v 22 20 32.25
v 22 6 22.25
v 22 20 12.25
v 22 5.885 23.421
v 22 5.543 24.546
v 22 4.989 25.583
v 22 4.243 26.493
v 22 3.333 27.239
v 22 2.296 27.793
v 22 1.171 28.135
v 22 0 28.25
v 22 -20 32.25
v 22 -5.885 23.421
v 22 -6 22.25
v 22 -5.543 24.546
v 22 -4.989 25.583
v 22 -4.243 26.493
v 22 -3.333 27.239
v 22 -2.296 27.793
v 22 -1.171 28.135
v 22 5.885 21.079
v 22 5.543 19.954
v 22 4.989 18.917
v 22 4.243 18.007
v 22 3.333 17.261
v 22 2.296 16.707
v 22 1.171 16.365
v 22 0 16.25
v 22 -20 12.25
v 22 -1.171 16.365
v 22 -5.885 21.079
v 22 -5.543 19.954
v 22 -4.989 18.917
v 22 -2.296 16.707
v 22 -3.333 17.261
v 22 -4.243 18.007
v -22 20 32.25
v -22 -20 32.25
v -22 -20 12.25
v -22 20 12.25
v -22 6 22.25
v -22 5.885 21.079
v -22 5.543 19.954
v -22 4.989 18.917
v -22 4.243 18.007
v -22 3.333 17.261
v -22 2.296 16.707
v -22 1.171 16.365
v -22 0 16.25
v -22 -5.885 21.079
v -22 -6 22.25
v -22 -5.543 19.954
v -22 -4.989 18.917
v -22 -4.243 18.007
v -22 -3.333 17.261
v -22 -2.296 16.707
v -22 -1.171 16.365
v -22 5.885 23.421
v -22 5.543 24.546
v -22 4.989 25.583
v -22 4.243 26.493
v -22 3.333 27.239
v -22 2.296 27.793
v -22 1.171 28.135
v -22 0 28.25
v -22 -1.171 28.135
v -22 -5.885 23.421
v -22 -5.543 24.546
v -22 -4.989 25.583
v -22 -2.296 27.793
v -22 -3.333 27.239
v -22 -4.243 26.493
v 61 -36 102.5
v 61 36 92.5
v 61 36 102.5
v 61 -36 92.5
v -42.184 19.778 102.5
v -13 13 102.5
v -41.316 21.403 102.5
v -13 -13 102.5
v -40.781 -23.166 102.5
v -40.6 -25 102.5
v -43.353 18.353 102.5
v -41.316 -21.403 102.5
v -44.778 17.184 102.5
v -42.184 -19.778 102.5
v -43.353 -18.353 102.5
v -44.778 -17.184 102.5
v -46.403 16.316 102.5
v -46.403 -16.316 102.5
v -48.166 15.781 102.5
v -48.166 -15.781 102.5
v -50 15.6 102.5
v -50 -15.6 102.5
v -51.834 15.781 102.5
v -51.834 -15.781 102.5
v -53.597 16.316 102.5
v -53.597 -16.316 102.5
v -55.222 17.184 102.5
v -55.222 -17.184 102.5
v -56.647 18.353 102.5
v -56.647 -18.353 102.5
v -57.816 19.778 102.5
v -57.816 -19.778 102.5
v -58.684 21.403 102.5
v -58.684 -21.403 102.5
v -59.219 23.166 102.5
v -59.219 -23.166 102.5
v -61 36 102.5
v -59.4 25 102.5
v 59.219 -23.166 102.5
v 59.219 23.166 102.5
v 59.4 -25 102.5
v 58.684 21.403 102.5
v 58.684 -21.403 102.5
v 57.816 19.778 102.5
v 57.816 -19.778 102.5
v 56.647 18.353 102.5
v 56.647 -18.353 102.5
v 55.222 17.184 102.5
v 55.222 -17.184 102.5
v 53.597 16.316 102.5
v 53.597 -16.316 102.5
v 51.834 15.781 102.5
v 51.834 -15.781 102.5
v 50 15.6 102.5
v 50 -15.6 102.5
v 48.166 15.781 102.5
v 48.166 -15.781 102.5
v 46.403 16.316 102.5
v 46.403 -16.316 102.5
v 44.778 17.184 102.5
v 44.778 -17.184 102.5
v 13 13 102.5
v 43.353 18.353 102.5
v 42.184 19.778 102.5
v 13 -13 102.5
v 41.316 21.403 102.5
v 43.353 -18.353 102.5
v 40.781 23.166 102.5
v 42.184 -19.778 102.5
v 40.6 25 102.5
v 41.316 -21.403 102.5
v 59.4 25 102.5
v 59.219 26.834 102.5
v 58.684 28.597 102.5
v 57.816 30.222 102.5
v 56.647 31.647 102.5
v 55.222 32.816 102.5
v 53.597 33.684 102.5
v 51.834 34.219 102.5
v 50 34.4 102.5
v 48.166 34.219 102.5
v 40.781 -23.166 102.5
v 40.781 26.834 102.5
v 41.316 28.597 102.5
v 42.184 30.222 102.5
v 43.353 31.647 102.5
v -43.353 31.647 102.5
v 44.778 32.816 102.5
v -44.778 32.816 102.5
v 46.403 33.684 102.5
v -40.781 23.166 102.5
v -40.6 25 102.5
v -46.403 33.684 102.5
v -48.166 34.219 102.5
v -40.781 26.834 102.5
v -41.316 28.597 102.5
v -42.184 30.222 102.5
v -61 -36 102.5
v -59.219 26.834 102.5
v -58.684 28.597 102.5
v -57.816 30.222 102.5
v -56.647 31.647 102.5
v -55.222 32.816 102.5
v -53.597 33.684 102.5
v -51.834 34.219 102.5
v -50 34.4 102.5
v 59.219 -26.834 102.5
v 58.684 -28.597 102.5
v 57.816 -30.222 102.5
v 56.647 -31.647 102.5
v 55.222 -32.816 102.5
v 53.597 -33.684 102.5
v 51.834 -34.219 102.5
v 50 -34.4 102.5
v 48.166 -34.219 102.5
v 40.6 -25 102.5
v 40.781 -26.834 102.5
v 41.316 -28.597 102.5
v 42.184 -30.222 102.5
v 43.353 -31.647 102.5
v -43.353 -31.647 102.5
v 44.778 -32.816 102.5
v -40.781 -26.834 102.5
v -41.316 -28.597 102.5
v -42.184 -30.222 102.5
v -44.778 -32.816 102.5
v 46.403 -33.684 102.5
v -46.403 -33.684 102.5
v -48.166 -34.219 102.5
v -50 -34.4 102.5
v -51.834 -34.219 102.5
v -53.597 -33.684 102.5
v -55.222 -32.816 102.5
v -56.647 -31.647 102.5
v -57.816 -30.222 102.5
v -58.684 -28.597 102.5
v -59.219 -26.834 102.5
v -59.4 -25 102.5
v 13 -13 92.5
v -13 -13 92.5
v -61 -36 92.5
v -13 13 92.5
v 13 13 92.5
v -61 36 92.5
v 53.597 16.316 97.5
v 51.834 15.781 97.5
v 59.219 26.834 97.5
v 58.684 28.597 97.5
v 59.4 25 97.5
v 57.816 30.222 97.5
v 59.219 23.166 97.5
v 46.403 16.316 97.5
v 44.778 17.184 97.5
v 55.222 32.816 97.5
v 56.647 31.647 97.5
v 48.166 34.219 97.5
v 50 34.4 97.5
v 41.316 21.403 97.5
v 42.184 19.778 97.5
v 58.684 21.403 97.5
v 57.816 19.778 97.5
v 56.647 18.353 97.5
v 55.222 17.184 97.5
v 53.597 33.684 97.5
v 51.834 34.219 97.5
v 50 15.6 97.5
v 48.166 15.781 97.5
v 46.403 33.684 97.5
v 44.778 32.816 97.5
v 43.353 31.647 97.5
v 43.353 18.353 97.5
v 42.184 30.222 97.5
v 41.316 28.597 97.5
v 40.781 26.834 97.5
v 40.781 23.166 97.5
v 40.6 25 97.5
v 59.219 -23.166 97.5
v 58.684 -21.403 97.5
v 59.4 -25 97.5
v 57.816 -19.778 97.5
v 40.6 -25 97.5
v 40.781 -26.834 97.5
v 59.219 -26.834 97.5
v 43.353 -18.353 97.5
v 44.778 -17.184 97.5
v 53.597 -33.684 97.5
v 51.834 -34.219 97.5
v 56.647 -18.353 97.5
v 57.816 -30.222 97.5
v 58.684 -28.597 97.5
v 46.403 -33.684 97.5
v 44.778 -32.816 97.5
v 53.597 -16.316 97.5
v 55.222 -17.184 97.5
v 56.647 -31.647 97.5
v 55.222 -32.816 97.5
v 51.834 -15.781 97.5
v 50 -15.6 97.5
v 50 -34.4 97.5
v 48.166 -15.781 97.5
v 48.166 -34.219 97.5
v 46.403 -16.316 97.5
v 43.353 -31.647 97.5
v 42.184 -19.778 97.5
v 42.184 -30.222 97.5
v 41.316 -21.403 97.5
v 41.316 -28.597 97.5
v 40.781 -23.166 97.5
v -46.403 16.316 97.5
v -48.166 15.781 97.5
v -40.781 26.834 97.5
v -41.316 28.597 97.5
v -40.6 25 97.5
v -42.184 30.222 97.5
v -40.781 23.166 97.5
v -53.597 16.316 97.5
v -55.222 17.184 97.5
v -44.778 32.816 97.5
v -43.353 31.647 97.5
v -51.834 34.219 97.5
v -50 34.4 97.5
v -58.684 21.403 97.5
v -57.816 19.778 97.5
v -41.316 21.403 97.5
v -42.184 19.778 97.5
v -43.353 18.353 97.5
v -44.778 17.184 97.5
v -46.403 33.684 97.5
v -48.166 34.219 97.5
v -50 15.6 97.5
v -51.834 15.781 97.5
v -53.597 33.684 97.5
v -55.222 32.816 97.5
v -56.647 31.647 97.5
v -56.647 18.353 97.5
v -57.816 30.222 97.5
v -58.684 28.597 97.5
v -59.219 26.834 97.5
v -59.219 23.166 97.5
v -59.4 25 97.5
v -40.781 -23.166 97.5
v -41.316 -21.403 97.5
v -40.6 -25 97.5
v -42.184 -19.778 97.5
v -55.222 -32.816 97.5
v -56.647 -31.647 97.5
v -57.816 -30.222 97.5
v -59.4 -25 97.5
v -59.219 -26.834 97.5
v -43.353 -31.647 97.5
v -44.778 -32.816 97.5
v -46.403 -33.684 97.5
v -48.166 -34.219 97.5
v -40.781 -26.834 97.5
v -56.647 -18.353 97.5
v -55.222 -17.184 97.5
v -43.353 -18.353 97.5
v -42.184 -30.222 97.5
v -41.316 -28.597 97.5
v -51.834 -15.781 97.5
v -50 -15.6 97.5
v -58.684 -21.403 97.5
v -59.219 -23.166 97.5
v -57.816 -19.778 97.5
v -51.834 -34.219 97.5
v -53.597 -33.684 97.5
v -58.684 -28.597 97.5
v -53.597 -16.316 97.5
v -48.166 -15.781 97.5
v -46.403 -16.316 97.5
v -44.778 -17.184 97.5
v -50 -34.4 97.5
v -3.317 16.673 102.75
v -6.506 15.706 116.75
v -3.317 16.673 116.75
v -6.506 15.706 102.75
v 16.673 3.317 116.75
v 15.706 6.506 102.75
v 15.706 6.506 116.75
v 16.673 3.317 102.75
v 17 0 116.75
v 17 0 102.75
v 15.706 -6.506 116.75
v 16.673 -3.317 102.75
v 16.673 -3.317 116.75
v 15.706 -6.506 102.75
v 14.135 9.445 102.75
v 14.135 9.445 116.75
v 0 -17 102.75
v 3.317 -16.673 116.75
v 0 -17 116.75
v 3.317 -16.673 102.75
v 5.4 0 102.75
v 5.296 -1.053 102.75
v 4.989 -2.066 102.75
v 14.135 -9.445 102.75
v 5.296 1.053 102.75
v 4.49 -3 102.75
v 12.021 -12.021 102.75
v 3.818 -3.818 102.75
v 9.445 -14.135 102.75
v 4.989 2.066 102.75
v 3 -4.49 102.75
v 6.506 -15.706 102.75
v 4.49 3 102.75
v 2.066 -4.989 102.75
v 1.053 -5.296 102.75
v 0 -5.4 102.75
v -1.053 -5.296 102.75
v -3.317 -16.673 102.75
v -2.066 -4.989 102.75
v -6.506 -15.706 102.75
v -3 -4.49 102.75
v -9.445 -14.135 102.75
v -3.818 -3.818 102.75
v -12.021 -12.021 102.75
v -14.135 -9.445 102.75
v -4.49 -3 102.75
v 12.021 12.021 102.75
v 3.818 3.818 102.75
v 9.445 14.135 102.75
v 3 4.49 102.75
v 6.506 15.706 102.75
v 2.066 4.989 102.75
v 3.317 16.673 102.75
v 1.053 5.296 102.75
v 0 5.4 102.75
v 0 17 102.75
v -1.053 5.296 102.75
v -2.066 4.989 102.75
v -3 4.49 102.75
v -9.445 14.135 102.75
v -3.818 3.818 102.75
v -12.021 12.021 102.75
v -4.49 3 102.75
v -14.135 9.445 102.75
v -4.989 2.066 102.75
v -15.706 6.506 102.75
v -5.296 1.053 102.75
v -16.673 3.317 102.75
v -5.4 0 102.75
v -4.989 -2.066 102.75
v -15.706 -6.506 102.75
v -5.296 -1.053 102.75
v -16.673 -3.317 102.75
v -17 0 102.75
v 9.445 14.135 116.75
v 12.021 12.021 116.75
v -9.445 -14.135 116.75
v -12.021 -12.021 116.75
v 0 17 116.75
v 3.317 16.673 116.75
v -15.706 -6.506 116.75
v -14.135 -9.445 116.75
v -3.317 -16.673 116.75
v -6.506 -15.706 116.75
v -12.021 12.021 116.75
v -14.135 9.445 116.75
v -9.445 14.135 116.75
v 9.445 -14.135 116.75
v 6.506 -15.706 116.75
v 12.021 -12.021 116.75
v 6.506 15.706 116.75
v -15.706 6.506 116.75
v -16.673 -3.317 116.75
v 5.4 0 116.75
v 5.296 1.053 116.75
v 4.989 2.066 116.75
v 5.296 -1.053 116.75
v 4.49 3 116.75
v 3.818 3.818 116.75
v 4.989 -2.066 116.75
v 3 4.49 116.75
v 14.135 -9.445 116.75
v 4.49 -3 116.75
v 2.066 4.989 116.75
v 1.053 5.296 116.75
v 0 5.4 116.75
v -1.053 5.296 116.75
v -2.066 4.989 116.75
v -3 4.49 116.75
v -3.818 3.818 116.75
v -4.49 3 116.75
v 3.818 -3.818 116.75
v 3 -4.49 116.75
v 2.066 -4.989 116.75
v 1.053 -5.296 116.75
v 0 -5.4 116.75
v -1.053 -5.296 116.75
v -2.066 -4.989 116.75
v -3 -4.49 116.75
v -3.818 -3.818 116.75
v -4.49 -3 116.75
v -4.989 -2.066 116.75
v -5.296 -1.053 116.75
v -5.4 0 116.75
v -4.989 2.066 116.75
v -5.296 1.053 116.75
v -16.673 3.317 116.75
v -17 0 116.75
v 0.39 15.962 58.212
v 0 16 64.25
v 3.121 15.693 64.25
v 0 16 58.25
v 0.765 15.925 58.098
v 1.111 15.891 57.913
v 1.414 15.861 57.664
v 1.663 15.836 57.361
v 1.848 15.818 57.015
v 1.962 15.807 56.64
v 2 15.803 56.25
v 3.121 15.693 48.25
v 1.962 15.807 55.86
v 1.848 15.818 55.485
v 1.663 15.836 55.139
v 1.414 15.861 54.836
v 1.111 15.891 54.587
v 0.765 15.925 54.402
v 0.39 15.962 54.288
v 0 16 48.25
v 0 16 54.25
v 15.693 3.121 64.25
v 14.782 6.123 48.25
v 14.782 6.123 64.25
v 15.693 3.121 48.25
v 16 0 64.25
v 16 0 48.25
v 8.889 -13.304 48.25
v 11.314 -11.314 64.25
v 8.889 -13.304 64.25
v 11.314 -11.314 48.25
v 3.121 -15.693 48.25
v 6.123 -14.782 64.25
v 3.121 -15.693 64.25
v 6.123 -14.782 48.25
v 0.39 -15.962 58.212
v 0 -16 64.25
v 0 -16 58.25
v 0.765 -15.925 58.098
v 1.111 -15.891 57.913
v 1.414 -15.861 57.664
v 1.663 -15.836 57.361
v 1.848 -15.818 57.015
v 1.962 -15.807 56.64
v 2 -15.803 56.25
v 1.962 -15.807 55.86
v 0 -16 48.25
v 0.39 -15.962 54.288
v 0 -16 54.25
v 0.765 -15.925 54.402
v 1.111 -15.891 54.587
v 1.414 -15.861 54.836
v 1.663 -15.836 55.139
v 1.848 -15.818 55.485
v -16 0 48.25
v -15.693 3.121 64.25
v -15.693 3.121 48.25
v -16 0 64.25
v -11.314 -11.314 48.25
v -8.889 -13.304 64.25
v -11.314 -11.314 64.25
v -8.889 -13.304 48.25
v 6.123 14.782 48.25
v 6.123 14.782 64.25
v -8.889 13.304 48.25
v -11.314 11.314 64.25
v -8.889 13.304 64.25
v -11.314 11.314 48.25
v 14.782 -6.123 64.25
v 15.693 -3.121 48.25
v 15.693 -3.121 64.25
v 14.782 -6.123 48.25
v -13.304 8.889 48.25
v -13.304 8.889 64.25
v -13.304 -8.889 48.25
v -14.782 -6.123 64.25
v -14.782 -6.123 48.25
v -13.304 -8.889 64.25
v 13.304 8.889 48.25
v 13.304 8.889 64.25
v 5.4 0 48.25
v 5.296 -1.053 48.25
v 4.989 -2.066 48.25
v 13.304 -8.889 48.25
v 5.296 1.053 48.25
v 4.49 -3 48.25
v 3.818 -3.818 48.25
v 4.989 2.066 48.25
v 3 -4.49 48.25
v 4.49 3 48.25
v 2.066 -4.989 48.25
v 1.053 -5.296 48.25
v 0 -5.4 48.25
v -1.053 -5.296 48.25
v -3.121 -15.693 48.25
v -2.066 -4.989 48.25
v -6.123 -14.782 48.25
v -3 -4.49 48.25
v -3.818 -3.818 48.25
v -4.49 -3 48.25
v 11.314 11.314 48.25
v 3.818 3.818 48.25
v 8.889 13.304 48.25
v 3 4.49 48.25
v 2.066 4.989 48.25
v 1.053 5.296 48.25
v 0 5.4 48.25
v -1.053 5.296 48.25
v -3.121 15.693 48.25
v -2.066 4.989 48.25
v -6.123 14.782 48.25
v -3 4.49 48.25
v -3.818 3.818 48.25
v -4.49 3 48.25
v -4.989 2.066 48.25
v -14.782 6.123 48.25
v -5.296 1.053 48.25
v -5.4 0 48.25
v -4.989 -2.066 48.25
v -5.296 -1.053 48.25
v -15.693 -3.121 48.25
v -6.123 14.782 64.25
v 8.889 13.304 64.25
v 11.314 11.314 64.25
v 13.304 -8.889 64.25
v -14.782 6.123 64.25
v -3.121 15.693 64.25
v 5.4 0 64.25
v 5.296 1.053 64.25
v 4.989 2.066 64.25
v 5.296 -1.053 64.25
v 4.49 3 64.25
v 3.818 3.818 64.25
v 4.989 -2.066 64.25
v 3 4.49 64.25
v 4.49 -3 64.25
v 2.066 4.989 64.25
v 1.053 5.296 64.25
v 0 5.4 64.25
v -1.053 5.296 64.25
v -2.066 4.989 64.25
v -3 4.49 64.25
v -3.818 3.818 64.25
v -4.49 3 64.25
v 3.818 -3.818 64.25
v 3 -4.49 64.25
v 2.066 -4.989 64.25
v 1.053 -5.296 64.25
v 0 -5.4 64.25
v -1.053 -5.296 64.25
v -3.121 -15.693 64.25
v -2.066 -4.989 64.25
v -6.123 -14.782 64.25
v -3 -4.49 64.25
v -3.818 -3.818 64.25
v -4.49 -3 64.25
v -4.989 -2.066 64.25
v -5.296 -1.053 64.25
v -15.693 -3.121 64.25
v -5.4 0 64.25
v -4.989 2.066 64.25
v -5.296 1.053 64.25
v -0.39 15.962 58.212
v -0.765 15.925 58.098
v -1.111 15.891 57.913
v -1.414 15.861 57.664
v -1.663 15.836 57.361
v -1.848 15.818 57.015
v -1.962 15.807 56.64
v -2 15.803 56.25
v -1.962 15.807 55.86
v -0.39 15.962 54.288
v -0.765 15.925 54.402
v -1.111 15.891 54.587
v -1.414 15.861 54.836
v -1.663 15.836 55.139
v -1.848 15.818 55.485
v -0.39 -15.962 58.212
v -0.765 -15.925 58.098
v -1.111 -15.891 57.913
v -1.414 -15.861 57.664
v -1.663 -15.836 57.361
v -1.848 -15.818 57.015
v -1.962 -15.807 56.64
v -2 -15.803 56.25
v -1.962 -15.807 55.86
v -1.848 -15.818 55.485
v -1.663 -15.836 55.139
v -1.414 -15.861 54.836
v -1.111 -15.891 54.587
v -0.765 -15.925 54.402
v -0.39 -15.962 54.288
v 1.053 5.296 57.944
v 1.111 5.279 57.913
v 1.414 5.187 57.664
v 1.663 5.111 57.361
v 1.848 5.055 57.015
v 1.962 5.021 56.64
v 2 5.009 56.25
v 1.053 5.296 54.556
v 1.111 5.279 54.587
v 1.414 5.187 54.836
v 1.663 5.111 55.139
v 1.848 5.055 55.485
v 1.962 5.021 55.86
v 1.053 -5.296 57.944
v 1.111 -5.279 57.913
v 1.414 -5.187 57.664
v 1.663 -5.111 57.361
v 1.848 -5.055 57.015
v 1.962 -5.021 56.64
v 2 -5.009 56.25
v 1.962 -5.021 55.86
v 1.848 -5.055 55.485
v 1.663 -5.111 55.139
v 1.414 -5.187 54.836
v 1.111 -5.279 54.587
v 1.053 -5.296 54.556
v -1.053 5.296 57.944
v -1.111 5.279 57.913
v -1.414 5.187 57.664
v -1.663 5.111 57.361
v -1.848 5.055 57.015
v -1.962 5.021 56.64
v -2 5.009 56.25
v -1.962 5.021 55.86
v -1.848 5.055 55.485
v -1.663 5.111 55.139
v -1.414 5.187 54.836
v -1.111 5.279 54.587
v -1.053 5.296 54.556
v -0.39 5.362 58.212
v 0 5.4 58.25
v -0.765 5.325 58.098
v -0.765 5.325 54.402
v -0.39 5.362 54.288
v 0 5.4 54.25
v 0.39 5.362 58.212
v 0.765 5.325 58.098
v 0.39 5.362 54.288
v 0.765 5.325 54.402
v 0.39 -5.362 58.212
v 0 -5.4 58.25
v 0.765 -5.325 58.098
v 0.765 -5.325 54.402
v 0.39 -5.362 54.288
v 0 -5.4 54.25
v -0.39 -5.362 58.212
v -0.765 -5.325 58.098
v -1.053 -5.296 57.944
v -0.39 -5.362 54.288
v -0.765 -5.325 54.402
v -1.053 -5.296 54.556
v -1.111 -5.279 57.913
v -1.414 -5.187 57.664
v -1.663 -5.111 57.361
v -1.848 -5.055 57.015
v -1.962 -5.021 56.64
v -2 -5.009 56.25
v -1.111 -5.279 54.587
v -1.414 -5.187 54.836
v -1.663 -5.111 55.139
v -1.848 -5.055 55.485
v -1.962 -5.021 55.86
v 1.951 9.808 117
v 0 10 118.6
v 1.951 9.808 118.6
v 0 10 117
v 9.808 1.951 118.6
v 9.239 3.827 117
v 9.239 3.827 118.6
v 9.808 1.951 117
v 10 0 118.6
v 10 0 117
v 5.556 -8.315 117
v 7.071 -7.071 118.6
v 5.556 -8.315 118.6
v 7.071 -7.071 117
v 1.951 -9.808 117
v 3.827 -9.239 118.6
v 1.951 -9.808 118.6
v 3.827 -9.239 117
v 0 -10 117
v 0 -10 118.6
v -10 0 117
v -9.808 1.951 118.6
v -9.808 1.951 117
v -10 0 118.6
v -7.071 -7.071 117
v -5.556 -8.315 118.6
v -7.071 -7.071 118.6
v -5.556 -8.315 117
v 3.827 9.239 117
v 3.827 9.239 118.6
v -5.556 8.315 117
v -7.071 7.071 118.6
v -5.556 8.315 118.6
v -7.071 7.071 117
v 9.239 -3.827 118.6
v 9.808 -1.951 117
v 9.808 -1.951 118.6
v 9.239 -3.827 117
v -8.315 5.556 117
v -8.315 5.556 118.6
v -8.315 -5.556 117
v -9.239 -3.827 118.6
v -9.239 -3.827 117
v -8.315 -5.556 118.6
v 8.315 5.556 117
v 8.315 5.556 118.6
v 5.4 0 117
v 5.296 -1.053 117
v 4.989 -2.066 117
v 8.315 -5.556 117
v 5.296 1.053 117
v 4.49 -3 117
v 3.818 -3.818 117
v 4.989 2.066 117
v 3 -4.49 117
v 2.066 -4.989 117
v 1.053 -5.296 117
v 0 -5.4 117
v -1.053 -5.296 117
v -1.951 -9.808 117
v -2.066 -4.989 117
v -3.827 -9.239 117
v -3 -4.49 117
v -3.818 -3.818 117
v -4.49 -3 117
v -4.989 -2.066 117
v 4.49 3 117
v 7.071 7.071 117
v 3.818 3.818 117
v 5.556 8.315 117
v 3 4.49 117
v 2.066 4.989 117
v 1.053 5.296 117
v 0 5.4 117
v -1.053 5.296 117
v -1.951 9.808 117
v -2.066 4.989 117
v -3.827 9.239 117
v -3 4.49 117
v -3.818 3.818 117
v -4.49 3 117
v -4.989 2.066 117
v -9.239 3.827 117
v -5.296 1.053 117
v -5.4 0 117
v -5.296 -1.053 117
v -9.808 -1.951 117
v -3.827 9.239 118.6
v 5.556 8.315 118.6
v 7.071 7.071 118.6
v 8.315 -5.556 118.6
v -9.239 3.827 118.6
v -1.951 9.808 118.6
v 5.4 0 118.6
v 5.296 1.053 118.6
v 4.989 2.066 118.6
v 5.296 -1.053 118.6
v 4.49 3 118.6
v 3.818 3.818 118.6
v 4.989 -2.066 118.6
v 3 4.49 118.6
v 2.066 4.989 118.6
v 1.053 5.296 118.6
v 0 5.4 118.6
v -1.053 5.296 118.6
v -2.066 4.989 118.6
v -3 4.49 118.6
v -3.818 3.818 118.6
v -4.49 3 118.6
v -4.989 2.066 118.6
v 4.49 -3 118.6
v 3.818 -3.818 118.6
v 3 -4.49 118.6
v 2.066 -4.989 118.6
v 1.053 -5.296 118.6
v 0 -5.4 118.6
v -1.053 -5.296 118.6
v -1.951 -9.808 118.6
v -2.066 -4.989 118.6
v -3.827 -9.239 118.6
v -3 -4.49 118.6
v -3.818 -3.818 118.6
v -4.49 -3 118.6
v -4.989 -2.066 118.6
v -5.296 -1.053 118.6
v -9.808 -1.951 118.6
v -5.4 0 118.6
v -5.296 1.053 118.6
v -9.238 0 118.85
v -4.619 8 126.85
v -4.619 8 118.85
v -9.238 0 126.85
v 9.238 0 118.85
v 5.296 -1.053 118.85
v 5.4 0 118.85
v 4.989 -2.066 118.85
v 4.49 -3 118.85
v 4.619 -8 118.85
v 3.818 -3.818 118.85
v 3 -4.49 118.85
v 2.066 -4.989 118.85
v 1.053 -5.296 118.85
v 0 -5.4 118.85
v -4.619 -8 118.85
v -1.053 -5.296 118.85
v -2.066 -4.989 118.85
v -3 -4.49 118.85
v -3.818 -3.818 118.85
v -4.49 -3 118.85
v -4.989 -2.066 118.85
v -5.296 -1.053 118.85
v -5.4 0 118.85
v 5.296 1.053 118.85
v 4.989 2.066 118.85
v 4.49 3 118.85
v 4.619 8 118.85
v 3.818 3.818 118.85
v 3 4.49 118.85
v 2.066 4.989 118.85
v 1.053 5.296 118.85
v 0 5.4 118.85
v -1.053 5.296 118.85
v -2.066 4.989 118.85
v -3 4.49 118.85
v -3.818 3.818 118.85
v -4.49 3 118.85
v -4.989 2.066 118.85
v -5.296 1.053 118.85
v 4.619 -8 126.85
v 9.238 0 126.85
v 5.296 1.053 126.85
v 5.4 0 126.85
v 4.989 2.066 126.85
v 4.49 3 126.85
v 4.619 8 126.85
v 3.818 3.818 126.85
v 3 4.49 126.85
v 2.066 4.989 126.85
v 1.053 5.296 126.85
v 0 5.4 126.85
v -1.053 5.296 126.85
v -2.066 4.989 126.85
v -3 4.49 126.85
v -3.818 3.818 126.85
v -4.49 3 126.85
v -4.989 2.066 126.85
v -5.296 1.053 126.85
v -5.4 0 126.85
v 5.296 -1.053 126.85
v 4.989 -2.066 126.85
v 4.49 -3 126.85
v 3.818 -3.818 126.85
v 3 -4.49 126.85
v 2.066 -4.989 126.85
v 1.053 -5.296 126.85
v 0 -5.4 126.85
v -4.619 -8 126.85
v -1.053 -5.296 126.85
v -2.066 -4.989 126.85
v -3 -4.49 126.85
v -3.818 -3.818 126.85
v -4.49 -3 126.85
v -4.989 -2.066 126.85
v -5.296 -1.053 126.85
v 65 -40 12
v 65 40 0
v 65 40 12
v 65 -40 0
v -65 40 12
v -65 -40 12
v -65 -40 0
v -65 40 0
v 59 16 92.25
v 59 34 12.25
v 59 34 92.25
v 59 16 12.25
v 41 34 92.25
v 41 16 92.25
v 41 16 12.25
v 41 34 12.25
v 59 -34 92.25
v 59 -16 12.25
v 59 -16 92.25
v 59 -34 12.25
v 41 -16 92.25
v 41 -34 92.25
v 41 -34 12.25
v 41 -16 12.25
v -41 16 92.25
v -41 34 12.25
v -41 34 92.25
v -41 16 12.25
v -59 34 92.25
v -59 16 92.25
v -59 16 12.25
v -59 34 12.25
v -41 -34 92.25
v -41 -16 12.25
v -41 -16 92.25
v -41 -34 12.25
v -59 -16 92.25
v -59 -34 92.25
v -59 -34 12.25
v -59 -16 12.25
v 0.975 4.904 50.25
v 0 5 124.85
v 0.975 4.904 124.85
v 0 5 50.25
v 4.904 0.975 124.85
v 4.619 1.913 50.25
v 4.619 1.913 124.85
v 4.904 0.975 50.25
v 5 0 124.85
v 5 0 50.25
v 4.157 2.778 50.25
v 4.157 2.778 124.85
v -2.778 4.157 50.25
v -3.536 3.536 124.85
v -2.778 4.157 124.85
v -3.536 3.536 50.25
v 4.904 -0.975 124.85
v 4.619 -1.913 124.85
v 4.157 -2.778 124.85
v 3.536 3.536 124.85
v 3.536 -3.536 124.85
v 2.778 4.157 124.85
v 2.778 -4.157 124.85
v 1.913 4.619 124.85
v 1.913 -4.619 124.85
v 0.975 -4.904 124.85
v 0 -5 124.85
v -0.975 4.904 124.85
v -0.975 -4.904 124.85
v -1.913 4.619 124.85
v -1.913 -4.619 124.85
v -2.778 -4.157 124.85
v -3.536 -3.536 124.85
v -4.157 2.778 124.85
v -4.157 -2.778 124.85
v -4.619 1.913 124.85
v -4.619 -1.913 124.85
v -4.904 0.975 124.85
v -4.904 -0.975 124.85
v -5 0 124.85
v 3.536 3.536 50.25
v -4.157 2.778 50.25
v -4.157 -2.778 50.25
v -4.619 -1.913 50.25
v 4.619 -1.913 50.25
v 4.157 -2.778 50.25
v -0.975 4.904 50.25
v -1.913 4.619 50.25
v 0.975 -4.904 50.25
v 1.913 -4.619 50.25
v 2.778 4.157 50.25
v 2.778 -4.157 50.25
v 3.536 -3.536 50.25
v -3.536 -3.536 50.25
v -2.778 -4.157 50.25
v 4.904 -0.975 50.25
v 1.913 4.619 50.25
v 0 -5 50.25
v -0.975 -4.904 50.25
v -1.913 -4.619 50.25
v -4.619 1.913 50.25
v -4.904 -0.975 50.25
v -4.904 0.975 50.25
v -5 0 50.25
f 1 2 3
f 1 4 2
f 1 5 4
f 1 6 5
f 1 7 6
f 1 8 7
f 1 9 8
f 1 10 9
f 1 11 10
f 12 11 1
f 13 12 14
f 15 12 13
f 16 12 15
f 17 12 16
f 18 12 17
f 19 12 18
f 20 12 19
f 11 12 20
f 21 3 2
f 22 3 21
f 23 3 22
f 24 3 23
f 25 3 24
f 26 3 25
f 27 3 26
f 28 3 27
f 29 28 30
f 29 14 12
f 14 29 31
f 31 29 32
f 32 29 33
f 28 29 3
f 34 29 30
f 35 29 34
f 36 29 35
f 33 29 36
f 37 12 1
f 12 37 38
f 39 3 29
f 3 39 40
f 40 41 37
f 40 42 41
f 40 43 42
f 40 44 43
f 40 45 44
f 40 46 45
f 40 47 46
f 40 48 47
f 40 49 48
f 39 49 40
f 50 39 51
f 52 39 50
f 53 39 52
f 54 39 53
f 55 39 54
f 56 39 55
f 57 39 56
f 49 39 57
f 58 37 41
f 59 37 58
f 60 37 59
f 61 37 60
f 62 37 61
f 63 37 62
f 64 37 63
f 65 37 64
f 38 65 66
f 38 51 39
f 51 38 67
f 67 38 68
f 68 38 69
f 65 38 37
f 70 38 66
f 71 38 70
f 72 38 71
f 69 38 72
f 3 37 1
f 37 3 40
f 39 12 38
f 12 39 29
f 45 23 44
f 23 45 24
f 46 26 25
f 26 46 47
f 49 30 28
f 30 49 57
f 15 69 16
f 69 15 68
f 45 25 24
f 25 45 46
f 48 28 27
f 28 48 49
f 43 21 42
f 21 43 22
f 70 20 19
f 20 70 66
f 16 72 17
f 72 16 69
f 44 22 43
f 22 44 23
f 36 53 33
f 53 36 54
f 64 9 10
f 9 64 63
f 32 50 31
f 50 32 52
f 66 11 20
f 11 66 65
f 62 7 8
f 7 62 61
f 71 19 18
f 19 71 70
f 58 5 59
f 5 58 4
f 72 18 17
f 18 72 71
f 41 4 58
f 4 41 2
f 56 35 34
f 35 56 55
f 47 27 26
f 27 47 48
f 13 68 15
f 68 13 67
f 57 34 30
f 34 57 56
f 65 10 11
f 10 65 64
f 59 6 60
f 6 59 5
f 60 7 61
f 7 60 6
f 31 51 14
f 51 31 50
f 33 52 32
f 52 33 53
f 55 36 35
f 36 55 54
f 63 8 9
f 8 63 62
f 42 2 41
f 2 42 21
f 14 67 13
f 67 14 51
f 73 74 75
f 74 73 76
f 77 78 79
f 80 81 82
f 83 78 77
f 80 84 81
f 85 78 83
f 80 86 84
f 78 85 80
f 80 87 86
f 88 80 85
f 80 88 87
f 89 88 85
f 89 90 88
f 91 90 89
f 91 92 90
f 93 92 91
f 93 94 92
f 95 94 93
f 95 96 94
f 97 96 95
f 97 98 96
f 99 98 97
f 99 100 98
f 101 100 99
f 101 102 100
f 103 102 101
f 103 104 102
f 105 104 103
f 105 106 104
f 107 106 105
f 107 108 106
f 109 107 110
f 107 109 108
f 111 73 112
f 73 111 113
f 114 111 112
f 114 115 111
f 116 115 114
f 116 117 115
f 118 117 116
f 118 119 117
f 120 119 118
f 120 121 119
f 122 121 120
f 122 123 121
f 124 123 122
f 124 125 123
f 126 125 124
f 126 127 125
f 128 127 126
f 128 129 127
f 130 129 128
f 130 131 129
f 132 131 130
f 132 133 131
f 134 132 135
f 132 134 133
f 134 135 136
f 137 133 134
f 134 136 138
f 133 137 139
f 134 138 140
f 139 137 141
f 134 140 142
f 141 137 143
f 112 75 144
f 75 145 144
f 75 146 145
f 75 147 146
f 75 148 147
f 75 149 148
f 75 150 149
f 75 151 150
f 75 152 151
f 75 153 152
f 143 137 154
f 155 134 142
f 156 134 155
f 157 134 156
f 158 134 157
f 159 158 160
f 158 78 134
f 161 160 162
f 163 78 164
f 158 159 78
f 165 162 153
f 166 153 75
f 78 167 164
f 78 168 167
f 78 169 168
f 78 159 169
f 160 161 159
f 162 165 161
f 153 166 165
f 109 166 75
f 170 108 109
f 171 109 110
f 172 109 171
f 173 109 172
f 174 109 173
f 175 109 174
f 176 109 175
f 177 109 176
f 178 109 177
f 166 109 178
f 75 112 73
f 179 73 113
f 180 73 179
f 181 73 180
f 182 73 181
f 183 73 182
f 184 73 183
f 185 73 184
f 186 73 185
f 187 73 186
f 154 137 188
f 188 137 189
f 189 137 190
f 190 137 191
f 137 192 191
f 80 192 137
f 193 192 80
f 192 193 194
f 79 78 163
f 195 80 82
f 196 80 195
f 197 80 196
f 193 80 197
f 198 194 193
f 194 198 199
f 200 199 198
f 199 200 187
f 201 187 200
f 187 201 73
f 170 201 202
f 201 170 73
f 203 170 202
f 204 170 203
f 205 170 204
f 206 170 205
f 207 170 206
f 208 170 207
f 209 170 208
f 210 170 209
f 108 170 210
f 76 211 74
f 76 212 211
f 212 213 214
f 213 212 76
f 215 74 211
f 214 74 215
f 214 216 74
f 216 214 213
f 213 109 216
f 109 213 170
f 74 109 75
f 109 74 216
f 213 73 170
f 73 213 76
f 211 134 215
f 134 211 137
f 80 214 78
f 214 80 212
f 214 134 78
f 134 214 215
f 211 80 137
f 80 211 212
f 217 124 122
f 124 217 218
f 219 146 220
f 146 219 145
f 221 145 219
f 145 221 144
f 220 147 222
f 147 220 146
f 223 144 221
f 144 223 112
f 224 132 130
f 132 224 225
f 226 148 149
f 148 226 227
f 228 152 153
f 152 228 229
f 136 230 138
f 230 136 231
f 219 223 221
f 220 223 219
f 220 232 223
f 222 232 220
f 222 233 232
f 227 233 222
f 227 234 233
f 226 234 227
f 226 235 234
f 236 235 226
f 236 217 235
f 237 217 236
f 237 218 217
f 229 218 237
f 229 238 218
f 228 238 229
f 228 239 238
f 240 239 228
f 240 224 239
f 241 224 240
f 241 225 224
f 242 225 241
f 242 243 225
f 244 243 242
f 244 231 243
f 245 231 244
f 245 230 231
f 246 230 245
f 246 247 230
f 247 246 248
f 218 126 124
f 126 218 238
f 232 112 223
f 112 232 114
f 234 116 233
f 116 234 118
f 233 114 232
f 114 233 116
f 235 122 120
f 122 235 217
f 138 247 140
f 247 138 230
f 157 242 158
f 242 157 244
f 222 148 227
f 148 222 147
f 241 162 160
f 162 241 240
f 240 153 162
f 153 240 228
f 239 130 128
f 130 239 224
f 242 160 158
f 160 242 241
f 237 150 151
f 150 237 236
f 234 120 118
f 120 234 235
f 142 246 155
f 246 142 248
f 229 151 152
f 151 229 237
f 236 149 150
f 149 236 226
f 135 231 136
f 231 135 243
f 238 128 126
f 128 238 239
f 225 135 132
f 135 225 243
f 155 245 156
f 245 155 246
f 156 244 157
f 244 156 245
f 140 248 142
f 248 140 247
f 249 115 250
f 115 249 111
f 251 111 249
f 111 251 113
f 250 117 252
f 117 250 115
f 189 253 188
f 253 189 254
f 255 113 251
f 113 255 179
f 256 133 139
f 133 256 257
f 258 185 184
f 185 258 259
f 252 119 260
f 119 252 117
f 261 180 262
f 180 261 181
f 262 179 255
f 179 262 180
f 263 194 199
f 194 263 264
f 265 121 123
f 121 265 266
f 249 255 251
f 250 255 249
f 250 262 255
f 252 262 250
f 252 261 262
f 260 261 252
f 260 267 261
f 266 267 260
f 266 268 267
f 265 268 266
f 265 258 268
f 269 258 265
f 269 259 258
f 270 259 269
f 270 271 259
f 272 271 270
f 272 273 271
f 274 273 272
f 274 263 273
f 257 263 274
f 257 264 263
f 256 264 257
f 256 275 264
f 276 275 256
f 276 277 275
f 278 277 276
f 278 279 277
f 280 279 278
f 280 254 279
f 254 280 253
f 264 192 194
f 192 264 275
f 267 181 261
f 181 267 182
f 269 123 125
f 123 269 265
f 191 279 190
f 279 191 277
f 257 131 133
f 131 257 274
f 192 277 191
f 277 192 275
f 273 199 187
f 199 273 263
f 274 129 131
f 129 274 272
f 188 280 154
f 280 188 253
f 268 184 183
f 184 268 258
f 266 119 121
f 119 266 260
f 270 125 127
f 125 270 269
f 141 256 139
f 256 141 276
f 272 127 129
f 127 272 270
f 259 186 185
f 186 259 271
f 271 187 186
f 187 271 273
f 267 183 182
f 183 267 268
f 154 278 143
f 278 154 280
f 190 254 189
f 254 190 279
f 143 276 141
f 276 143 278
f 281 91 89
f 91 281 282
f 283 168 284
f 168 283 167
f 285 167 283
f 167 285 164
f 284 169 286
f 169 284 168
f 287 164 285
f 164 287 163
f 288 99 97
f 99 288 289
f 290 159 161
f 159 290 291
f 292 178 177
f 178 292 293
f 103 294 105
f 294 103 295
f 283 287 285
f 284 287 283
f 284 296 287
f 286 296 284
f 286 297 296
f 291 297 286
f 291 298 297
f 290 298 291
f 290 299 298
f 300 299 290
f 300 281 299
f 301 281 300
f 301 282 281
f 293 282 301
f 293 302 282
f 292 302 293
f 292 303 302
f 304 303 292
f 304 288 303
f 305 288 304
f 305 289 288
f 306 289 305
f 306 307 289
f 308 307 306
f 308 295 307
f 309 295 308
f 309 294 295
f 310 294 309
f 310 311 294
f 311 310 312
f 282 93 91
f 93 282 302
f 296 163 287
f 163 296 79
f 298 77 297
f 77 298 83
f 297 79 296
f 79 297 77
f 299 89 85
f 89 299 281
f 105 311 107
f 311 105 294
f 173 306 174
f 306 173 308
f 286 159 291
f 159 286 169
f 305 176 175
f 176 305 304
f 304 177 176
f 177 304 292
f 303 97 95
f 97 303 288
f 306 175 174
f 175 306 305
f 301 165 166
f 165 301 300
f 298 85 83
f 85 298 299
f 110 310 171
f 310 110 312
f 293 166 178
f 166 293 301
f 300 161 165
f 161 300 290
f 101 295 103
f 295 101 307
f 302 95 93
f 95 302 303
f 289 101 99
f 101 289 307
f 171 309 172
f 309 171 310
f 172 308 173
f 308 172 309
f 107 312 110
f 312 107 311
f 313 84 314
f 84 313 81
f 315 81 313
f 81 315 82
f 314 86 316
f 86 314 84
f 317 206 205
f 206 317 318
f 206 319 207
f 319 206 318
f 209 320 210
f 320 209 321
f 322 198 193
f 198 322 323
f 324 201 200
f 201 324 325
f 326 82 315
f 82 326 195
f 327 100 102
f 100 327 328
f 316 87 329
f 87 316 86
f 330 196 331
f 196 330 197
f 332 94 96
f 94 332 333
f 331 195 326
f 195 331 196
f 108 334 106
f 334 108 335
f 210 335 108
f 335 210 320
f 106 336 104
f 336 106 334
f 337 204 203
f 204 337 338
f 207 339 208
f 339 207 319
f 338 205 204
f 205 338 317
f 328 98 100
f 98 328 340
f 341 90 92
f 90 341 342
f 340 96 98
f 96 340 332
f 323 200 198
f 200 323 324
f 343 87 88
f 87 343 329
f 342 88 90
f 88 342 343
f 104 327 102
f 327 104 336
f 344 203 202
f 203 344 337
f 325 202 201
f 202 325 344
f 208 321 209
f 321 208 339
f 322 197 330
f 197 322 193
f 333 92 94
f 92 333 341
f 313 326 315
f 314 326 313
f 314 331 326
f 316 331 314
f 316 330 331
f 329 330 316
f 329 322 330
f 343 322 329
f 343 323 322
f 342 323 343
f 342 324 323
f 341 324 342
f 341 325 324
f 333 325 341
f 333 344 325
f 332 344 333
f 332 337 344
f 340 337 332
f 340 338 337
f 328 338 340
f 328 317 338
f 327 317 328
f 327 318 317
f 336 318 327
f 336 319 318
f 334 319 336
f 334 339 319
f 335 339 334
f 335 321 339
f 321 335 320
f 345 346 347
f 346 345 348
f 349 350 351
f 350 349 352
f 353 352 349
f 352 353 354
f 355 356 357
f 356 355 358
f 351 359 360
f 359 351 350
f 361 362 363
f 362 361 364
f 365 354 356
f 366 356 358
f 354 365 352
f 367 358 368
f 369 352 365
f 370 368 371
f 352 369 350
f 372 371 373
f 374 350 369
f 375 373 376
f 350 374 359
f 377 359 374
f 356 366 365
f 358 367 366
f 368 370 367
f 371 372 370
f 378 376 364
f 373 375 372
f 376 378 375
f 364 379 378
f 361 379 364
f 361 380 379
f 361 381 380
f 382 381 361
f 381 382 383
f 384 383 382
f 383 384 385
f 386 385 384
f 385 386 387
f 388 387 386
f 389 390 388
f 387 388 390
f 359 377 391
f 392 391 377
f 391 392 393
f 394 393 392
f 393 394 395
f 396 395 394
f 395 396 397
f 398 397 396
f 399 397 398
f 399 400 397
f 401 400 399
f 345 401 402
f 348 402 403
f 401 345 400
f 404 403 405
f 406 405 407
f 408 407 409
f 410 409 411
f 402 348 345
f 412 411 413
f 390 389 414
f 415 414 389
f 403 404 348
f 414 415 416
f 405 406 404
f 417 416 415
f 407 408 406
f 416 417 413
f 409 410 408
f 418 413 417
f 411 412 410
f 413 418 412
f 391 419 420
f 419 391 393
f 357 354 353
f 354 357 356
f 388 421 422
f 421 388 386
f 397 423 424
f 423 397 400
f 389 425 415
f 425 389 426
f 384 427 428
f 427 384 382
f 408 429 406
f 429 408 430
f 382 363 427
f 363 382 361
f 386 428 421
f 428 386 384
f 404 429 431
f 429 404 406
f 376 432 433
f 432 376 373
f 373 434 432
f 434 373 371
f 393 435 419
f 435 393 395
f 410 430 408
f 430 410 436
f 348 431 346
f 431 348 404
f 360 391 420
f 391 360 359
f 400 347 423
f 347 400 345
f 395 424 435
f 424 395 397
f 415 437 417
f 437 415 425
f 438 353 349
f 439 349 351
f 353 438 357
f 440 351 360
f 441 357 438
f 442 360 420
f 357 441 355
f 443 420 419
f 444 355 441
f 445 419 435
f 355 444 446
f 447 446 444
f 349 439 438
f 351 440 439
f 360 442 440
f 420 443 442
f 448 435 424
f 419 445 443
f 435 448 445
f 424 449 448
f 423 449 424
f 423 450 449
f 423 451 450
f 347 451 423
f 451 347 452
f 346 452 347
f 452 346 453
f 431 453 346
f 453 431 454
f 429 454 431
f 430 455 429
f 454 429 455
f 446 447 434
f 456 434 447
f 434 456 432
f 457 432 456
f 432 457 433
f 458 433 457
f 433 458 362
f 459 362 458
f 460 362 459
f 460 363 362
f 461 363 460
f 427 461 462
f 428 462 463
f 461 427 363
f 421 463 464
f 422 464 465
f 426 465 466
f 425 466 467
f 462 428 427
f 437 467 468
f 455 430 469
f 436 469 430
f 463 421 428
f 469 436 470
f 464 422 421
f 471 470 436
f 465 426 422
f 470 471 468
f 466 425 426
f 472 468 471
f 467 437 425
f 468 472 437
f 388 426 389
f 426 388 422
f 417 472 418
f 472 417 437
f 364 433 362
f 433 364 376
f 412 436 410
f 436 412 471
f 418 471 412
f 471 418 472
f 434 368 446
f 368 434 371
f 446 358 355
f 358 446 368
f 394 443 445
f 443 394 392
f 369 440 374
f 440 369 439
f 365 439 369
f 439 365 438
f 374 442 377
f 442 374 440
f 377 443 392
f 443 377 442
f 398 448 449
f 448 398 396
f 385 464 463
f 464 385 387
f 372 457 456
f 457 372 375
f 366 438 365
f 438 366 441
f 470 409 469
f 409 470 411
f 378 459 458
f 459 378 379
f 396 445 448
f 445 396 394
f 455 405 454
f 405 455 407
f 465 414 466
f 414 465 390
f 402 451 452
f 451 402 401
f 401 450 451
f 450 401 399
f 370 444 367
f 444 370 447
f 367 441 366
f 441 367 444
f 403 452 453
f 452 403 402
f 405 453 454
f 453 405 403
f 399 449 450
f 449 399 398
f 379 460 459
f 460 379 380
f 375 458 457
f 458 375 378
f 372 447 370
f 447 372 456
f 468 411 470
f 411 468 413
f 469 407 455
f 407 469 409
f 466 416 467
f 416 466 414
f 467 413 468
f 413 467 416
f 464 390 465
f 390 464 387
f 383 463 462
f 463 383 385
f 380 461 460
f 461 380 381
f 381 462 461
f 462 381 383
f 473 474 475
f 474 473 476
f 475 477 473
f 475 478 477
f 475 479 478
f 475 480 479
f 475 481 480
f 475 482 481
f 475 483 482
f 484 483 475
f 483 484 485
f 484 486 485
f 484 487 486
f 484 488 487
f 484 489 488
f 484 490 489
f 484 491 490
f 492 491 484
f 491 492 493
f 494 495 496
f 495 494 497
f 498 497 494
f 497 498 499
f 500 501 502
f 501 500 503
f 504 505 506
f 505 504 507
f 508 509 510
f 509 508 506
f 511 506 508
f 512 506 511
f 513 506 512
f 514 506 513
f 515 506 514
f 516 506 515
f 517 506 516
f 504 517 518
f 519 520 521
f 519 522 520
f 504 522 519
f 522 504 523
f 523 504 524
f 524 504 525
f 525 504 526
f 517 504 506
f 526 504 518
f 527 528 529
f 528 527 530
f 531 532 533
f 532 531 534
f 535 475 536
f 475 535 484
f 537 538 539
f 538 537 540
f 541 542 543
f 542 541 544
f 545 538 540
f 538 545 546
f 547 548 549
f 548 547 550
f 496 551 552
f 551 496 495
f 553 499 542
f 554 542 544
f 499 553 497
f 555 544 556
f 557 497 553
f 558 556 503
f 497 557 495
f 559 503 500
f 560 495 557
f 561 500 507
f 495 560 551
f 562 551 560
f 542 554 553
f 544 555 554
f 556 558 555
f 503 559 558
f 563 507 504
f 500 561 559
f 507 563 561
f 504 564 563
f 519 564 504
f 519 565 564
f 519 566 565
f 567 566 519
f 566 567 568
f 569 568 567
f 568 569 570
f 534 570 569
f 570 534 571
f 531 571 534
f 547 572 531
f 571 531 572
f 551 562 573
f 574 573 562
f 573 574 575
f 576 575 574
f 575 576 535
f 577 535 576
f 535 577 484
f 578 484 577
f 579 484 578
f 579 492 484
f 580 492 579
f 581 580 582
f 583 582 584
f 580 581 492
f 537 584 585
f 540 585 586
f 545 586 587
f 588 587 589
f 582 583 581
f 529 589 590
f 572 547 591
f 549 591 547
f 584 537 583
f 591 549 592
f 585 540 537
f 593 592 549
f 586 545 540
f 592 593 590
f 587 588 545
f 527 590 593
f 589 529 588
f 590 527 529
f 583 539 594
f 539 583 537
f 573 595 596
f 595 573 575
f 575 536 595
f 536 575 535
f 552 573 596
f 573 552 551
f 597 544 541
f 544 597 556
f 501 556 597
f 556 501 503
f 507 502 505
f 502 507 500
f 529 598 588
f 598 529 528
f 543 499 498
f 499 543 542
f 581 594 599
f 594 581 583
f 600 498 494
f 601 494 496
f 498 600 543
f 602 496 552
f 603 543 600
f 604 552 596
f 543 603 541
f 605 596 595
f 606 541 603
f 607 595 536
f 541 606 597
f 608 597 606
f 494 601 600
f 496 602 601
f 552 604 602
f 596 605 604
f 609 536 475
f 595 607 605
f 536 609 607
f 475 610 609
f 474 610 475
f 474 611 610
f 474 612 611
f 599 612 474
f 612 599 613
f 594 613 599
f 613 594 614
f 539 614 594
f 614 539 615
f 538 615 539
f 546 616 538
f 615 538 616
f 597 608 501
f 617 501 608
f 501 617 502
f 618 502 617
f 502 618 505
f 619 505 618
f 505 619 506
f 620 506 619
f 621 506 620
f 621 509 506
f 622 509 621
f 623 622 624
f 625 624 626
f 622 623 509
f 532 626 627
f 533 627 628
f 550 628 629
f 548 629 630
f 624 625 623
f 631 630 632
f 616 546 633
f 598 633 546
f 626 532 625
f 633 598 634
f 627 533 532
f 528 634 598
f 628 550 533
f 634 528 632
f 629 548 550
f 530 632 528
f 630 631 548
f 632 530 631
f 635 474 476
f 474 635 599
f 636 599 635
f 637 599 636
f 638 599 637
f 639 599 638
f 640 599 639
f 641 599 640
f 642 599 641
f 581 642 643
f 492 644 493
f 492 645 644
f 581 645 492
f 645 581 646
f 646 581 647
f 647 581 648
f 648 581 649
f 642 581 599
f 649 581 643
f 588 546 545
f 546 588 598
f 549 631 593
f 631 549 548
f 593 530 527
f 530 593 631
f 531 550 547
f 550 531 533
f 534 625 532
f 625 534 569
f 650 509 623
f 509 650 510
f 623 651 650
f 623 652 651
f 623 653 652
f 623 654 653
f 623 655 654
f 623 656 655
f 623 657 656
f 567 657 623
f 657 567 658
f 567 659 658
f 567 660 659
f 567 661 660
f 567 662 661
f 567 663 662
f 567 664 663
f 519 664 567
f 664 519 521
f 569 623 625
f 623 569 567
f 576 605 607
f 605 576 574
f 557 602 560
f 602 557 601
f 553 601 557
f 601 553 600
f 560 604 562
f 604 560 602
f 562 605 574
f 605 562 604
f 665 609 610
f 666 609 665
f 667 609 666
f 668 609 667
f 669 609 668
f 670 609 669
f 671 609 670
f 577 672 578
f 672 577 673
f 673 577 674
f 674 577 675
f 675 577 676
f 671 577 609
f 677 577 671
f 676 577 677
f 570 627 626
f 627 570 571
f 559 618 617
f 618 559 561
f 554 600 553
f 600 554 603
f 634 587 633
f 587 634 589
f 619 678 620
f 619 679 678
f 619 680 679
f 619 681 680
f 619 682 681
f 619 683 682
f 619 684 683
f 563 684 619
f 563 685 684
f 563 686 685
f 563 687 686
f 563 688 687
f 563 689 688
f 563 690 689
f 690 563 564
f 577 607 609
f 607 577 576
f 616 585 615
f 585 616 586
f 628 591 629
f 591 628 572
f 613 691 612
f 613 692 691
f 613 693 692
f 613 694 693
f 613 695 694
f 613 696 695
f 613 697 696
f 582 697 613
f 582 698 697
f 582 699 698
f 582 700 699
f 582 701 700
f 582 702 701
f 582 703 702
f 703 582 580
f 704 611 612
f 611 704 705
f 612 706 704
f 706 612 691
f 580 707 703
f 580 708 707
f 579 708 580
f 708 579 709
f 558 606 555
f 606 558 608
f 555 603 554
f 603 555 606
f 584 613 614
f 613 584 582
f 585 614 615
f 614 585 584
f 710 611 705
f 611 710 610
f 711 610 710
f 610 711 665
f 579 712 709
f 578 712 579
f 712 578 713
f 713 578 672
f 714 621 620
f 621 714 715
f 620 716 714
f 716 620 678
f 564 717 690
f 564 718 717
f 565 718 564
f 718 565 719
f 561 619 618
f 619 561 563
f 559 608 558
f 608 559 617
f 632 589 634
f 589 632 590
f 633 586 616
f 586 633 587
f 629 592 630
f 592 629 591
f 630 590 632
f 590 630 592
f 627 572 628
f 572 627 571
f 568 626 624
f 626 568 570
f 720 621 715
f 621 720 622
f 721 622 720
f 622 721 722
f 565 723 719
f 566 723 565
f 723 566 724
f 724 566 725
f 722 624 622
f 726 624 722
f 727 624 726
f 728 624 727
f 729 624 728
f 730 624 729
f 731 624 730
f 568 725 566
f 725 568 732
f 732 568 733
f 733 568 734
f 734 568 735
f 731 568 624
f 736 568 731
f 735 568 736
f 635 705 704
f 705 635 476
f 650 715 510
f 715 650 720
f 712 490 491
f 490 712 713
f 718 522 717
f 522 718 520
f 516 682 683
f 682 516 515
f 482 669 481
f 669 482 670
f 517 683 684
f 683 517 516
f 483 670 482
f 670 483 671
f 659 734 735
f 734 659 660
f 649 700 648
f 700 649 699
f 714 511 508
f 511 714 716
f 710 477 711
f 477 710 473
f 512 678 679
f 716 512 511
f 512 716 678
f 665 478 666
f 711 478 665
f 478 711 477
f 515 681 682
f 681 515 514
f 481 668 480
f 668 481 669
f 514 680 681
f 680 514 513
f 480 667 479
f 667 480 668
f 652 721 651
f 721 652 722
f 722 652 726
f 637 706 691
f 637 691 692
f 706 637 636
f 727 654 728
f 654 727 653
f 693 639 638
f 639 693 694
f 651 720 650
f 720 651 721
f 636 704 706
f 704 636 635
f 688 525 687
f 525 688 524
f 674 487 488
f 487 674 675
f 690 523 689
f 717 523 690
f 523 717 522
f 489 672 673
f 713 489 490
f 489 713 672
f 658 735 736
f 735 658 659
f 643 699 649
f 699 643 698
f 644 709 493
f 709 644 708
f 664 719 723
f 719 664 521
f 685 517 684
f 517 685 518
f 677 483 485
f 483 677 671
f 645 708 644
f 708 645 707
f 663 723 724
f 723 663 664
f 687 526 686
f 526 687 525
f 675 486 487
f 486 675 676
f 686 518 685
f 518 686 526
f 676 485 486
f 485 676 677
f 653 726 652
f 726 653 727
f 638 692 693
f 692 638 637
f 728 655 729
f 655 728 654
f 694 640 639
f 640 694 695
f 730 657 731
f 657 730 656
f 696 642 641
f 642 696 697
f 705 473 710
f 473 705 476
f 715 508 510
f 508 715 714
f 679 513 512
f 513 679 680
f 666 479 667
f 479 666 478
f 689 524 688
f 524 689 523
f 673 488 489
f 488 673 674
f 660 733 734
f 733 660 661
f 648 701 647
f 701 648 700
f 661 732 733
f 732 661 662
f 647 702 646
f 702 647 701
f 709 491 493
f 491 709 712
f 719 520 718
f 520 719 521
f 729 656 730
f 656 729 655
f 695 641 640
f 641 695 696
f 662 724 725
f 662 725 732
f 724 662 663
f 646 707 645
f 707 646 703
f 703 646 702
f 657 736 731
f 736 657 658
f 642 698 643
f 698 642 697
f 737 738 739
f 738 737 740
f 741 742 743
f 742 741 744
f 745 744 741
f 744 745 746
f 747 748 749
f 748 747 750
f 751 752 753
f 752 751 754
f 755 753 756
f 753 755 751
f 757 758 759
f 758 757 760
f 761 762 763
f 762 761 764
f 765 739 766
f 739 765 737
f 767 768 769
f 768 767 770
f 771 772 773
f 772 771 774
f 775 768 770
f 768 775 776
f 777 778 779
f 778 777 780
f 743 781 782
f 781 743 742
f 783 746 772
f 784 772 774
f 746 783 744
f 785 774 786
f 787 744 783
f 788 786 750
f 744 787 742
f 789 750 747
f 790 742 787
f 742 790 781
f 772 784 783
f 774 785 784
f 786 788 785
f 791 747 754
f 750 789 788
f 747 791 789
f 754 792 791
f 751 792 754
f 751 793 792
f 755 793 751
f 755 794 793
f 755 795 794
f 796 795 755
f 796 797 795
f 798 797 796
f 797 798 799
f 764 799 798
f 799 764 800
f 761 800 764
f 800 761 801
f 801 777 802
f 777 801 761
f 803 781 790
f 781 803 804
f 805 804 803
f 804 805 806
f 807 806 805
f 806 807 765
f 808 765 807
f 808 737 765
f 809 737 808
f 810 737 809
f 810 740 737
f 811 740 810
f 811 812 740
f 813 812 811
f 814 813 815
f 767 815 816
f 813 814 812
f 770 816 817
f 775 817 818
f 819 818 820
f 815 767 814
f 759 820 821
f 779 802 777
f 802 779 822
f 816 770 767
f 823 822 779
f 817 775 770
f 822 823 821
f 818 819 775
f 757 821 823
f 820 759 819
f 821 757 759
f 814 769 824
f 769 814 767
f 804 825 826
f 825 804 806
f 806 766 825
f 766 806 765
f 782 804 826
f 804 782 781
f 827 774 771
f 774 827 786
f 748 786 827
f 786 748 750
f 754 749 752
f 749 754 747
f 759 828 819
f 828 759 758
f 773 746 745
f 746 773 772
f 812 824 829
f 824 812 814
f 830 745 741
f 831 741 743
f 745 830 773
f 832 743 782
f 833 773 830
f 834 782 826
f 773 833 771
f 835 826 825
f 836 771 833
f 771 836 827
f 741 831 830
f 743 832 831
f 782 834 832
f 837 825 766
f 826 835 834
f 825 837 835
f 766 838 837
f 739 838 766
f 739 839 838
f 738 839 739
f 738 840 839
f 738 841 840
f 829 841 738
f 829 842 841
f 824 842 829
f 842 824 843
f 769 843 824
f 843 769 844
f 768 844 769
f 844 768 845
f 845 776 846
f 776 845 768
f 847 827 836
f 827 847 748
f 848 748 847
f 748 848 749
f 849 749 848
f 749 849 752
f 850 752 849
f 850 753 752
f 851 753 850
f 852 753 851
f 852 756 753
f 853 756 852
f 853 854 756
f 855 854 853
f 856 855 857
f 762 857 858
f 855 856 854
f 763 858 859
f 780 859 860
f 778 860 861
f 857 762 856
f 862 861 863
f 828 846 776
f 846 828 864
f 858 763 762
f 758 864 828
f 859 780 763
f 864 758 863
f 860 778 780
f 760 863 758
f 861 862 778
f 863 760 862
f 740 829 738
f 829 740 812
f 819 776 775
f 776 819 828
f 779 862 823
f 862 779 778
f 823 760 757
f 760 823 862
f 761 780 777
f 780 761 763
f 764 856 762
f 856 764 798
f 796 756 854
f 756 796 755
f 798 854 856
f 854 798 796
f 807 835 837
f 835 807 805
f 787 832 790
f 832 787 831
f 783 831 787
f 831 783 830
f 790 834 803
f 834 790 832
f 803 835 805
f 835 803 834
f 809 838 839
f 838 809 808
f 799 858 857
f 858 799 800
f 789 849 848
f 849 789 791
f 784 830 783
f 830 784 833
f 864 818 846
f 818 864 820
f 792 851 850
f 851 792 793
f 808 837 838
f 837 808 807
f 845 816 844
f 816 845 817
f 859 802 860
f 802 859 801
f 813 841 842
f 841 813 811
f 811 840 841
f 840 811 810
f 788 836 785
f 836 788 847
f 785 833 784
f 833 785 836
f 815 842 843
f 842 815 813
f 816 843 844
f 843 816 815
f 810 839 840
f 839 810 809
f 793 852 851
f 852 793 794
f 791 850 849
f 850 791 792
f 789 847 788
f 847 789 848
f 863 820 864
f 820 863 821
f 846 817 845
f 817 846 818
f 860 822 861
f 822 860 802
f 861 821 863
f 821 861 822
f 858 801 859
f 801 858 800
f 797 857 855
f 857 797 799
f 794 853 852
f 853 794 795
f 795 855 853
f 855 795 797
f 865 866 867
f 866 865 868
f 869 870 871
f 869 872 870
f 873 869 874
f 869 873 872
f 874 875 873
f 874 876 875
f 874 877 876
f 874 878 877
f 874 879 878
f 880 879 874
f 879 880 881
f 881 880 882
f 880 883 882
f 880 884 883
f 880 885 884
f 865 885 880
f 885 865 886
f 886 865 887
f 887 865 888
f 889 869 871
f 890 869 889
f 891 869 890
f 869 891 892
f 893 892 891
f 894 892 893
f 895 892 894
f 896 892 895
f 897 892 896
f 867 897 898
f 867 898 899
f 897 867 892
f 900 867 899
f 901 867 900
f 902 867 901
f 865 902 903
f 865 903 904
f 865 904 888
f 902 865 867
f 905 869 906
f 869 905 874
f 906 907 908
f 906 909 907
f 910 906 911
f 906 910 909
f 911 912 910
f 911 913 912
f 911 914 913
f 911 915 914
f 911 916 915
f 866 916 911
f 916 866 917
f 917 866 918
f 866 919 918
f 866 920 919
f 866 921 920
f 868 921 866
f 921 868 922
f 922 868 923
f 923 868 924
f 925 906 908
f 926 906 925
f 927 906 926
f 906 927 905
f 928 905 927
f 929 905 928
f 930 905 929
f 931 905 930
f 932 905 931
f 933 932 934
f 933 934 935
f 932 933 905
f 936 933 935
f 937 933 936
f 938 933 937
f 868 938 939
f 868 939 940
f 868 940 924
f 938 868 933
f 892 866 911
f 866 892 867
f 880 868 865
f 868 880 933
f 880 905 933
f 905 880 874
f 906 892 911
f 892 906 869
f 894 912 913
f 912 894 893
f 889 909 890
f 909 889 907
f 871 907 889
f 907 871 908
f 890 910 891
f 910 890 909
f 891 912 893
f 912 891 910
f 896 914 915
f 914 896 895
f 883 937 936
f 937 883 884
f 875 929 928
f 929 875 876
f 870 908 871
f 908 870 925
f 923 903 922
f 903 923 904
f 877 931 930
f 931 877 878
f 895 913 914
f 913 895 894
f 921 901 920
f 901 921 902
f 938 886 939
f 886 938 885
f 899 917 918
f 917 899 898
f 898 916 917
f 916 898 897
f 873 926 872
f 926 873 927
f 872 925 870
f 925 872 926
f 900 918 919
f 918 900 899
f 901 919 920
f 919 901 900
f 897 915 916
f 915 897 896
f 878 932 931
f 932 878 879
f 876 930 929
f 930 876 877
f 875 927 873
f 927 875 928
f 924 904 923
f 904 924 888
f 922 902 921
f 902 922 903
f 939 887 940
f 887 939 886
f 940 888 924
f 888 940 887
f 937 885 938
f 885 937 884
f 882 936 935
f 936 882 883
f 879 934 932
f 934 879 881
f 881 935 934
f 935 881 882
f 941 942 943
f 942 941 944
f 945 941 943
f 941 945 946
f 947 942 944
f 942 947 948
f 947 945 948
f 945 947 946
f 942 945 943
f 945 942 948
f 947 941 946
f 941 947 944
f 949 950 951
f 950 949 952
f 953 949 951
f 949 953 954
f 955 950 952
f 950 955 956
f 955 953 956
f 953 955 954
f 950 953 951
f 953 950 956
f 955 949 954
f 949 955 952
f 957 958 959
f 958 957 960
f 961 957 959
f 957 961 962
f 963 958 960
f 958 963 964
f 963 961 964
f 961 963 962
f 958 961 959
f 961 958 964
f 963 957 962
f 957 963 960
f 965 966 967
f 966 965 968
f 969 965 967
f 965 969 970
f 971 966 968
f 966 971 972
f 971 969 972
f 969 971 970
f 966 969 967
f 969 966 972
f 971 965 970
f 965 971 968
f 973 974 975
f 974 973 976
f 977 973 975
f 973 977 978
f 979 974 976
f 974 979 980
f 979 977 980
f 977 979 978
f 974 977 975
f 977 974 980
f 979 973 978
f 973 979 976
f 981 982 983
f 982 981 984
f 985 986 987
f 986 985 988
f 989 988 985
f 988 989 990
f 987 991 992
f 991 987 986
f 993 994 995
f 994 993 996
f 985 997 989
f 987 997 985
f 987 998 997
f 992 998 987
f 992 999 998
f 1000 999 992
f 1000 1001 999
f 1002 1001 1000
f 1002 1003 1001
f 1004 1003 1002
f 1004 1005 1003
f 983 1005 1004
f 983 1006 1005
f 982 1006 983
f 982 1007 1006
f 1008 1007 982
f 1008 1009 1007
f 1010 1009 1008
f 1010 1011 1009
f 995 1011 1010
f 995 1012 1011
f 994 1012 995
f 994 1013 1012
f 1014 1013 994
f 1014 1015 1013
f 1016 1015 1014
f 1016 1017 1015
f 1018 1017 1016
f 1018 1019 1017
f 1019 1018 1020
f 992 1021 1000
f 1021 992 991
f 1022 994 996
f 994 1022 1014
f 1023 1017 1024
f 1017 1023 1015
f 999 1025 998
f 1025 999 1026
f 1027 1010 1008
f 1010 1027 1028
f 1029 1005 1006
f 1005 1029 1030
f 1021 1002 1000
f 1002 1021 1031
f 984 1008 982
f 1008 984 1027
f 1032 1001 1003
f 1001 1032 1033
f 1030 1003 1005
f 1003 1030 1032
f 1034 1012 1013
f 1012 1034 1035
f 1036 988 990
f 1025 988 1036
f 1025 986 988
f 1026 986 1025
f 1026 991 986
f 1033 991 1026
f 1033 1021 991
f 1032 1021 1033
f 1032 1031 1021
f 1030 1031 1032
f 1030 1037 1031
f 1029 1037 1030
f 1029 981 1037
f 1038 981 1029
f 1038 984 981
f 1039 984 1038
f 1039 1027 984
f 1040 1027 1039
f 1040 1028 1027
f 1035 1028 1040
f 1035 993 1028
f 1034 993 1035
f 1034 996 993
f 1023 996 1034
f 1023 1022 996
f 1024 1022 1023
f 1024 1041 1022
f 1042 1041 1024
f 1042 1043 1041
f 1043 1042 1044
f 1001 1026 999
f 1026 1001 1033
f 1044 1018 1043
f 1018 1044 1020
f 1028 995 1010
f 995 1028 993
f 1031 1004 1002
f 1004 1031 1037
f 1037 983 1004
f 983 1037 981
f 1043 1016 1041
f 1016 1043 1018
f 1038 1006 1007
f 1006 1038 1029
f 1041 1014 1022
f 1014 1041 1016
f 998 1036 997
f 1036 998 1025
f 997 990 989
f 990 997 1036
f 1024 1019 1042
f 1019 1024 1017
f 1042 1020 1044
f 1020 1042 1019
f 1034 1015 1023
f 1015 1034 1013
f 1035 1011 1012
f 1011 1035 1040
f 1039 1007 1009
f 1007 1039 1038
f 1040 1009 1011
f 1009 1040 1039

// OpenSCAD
$fn = 32;

// ------------------------------------------------------------------------
// Arbor press fixture: screw d10, posts 80 mm, gap 16 mm
// Every part is its own module, assembly() places every instance.
// ------------------------------------------------------------------------

// --- part 1 ---
module press_bed() {
  difference() {
    translate([-65, -40, 0]) cube([130, 80, 12]);
  }
}

// --- part 2 ---
module anvil_block() {
  difference() {
    translate([-22, -20, 0]) cube([44, 40, 20]);
    translate([0, 0, 10]) rotate([0, 90, 0]) cylinder(h = 46, d = 12, center = true);
  }
}

// --- part 3 ---
module press_post_a() {
  translate([-9, -9, 0]) cube([18, 18, 80]);
}

// --- part 4 ---
module press_post_b() {
  translate([-9, -9, 0]) cube([18, 18, 80]);
}

// --- part 5 ---
module press_post_c() {
  translate([-9, -9, 0]) cube([18, 18, 80]);
}

// --- part 6 ---
module press_post_d() {
  translate([-9, -9, 0]) cube([18, 18, 80]);
}

// --- part 7 ---
module press_frame() {
  difference() {
    translate([-61, -36, 0]) cube([122, 72, 10]);
    translate([-13, -13, -1]) cube([26, 26, 12]);
    translate([50, 25, 5]) cylinder(h = 6, d = 18.8);
    translate([50, -25, 5]) cylinder(h = 6, d = 18.8);
    translate([-50, 25, 5]) cylinder(h = 6, d = 18.8);
    translate([-50, -25, 5]) cylinder(h = 6, d = 18.8);
  }
}

// --- part 8 ---
module guide_ring() {
  difference() {
      translate([0, 0, 0]) cylinder(h = 14, d = 34);
      translate([0, 0, -1]) cylinder(h = 16, d = 10.8);
    }
}

// --- part 9 ---
module press_screw() {
  translate([0, 0, -37.3]) cylinder(h = 74.6, d = 10);
}

// --- part 10 ---
module press_head() {
  difference() {
    cylinder(h = 16, d = 32);
    translate([0, 0, -1]) cylinder(h = 18, d = 10.8);
    translate([0, 0, 8]) rotate([90, 0, 0]) cylinder(h = 34, d = 4, center = true);
  }
}

// --- part 11 ---
module nut_washer() {
  difference() {
      translate([0, 0, 0]) cylinder(h = 1.6, d = 20);
      translate([0, 0, -1]) cylinder(h = 3.6, d = 10.8);
    }
}

// --- part 12 ---
module press_nut() {
  difference() {
    linear_extrude(height = 8) polygon(points = [[9.238, 0], [4.619, 8], [-4.619, 8], [-9.238, 0], [-4.619, -8], [4.619, -8]]);
    translate([0, 0, -1]) cylinder(h = 10, d = 10.8);
  }
}

// --- assembly ---
module assembly() {
  color([0.80, 0.24, 0.20]) translate([0, 0, 0]) rotate([0, 0, 0]) press_bed();
  color([0.20, 0.45, 0.75]) translate([0, 0, 12.25]) rotate([0, 0, 0]) anvil_block();
  color([0.25, 0.62, 0.32]) translate([50, 25, 12.25]) rotate([0, 0, 0]) press_post_a();
  color([0.92, 0.70, 0.18]) translate([50, -25, 12.25]) rotate([0, 0, 0]) press_post_b();
  color([0.58, 0.35, 0.70]) translate([-50, 25, 12.25]) rotate([0, 0, 0]) press_post_c();
  color([0.16, 0.66, 0.66]) translate([-50, -25, 12.25]) rotate([0, 0, 0]) press_post_d();
  color([0.85, 0.48, 0.18]) translate([0, 0, 92.5]) rotate([0, 0, 0]) press_frame();
  color([0.55, 0.60, 0.65]) translate([0, 0, 102.75]) rotate([0, 0, 0]) guide_ring();
  color([0.75, 0.30, 0.55]) translate([0, 0, 87.55]) rotate([0, 0, 0]) press_screw();
  color([0.42, 0.52, 0.28]) translate([0, 0, 48.25]) rotate([0, 0, 0]) press_head();
  color([0.80, 0.24, 0.20]) translate([0, 0, 117]) rotate([0, 0, 0]) nut_washer();
  color([0.20, 0.45, 0.75]) translate([0, 0, 118.85]) rotate([0, 0, 0]) press_nut();
}

assembly();
